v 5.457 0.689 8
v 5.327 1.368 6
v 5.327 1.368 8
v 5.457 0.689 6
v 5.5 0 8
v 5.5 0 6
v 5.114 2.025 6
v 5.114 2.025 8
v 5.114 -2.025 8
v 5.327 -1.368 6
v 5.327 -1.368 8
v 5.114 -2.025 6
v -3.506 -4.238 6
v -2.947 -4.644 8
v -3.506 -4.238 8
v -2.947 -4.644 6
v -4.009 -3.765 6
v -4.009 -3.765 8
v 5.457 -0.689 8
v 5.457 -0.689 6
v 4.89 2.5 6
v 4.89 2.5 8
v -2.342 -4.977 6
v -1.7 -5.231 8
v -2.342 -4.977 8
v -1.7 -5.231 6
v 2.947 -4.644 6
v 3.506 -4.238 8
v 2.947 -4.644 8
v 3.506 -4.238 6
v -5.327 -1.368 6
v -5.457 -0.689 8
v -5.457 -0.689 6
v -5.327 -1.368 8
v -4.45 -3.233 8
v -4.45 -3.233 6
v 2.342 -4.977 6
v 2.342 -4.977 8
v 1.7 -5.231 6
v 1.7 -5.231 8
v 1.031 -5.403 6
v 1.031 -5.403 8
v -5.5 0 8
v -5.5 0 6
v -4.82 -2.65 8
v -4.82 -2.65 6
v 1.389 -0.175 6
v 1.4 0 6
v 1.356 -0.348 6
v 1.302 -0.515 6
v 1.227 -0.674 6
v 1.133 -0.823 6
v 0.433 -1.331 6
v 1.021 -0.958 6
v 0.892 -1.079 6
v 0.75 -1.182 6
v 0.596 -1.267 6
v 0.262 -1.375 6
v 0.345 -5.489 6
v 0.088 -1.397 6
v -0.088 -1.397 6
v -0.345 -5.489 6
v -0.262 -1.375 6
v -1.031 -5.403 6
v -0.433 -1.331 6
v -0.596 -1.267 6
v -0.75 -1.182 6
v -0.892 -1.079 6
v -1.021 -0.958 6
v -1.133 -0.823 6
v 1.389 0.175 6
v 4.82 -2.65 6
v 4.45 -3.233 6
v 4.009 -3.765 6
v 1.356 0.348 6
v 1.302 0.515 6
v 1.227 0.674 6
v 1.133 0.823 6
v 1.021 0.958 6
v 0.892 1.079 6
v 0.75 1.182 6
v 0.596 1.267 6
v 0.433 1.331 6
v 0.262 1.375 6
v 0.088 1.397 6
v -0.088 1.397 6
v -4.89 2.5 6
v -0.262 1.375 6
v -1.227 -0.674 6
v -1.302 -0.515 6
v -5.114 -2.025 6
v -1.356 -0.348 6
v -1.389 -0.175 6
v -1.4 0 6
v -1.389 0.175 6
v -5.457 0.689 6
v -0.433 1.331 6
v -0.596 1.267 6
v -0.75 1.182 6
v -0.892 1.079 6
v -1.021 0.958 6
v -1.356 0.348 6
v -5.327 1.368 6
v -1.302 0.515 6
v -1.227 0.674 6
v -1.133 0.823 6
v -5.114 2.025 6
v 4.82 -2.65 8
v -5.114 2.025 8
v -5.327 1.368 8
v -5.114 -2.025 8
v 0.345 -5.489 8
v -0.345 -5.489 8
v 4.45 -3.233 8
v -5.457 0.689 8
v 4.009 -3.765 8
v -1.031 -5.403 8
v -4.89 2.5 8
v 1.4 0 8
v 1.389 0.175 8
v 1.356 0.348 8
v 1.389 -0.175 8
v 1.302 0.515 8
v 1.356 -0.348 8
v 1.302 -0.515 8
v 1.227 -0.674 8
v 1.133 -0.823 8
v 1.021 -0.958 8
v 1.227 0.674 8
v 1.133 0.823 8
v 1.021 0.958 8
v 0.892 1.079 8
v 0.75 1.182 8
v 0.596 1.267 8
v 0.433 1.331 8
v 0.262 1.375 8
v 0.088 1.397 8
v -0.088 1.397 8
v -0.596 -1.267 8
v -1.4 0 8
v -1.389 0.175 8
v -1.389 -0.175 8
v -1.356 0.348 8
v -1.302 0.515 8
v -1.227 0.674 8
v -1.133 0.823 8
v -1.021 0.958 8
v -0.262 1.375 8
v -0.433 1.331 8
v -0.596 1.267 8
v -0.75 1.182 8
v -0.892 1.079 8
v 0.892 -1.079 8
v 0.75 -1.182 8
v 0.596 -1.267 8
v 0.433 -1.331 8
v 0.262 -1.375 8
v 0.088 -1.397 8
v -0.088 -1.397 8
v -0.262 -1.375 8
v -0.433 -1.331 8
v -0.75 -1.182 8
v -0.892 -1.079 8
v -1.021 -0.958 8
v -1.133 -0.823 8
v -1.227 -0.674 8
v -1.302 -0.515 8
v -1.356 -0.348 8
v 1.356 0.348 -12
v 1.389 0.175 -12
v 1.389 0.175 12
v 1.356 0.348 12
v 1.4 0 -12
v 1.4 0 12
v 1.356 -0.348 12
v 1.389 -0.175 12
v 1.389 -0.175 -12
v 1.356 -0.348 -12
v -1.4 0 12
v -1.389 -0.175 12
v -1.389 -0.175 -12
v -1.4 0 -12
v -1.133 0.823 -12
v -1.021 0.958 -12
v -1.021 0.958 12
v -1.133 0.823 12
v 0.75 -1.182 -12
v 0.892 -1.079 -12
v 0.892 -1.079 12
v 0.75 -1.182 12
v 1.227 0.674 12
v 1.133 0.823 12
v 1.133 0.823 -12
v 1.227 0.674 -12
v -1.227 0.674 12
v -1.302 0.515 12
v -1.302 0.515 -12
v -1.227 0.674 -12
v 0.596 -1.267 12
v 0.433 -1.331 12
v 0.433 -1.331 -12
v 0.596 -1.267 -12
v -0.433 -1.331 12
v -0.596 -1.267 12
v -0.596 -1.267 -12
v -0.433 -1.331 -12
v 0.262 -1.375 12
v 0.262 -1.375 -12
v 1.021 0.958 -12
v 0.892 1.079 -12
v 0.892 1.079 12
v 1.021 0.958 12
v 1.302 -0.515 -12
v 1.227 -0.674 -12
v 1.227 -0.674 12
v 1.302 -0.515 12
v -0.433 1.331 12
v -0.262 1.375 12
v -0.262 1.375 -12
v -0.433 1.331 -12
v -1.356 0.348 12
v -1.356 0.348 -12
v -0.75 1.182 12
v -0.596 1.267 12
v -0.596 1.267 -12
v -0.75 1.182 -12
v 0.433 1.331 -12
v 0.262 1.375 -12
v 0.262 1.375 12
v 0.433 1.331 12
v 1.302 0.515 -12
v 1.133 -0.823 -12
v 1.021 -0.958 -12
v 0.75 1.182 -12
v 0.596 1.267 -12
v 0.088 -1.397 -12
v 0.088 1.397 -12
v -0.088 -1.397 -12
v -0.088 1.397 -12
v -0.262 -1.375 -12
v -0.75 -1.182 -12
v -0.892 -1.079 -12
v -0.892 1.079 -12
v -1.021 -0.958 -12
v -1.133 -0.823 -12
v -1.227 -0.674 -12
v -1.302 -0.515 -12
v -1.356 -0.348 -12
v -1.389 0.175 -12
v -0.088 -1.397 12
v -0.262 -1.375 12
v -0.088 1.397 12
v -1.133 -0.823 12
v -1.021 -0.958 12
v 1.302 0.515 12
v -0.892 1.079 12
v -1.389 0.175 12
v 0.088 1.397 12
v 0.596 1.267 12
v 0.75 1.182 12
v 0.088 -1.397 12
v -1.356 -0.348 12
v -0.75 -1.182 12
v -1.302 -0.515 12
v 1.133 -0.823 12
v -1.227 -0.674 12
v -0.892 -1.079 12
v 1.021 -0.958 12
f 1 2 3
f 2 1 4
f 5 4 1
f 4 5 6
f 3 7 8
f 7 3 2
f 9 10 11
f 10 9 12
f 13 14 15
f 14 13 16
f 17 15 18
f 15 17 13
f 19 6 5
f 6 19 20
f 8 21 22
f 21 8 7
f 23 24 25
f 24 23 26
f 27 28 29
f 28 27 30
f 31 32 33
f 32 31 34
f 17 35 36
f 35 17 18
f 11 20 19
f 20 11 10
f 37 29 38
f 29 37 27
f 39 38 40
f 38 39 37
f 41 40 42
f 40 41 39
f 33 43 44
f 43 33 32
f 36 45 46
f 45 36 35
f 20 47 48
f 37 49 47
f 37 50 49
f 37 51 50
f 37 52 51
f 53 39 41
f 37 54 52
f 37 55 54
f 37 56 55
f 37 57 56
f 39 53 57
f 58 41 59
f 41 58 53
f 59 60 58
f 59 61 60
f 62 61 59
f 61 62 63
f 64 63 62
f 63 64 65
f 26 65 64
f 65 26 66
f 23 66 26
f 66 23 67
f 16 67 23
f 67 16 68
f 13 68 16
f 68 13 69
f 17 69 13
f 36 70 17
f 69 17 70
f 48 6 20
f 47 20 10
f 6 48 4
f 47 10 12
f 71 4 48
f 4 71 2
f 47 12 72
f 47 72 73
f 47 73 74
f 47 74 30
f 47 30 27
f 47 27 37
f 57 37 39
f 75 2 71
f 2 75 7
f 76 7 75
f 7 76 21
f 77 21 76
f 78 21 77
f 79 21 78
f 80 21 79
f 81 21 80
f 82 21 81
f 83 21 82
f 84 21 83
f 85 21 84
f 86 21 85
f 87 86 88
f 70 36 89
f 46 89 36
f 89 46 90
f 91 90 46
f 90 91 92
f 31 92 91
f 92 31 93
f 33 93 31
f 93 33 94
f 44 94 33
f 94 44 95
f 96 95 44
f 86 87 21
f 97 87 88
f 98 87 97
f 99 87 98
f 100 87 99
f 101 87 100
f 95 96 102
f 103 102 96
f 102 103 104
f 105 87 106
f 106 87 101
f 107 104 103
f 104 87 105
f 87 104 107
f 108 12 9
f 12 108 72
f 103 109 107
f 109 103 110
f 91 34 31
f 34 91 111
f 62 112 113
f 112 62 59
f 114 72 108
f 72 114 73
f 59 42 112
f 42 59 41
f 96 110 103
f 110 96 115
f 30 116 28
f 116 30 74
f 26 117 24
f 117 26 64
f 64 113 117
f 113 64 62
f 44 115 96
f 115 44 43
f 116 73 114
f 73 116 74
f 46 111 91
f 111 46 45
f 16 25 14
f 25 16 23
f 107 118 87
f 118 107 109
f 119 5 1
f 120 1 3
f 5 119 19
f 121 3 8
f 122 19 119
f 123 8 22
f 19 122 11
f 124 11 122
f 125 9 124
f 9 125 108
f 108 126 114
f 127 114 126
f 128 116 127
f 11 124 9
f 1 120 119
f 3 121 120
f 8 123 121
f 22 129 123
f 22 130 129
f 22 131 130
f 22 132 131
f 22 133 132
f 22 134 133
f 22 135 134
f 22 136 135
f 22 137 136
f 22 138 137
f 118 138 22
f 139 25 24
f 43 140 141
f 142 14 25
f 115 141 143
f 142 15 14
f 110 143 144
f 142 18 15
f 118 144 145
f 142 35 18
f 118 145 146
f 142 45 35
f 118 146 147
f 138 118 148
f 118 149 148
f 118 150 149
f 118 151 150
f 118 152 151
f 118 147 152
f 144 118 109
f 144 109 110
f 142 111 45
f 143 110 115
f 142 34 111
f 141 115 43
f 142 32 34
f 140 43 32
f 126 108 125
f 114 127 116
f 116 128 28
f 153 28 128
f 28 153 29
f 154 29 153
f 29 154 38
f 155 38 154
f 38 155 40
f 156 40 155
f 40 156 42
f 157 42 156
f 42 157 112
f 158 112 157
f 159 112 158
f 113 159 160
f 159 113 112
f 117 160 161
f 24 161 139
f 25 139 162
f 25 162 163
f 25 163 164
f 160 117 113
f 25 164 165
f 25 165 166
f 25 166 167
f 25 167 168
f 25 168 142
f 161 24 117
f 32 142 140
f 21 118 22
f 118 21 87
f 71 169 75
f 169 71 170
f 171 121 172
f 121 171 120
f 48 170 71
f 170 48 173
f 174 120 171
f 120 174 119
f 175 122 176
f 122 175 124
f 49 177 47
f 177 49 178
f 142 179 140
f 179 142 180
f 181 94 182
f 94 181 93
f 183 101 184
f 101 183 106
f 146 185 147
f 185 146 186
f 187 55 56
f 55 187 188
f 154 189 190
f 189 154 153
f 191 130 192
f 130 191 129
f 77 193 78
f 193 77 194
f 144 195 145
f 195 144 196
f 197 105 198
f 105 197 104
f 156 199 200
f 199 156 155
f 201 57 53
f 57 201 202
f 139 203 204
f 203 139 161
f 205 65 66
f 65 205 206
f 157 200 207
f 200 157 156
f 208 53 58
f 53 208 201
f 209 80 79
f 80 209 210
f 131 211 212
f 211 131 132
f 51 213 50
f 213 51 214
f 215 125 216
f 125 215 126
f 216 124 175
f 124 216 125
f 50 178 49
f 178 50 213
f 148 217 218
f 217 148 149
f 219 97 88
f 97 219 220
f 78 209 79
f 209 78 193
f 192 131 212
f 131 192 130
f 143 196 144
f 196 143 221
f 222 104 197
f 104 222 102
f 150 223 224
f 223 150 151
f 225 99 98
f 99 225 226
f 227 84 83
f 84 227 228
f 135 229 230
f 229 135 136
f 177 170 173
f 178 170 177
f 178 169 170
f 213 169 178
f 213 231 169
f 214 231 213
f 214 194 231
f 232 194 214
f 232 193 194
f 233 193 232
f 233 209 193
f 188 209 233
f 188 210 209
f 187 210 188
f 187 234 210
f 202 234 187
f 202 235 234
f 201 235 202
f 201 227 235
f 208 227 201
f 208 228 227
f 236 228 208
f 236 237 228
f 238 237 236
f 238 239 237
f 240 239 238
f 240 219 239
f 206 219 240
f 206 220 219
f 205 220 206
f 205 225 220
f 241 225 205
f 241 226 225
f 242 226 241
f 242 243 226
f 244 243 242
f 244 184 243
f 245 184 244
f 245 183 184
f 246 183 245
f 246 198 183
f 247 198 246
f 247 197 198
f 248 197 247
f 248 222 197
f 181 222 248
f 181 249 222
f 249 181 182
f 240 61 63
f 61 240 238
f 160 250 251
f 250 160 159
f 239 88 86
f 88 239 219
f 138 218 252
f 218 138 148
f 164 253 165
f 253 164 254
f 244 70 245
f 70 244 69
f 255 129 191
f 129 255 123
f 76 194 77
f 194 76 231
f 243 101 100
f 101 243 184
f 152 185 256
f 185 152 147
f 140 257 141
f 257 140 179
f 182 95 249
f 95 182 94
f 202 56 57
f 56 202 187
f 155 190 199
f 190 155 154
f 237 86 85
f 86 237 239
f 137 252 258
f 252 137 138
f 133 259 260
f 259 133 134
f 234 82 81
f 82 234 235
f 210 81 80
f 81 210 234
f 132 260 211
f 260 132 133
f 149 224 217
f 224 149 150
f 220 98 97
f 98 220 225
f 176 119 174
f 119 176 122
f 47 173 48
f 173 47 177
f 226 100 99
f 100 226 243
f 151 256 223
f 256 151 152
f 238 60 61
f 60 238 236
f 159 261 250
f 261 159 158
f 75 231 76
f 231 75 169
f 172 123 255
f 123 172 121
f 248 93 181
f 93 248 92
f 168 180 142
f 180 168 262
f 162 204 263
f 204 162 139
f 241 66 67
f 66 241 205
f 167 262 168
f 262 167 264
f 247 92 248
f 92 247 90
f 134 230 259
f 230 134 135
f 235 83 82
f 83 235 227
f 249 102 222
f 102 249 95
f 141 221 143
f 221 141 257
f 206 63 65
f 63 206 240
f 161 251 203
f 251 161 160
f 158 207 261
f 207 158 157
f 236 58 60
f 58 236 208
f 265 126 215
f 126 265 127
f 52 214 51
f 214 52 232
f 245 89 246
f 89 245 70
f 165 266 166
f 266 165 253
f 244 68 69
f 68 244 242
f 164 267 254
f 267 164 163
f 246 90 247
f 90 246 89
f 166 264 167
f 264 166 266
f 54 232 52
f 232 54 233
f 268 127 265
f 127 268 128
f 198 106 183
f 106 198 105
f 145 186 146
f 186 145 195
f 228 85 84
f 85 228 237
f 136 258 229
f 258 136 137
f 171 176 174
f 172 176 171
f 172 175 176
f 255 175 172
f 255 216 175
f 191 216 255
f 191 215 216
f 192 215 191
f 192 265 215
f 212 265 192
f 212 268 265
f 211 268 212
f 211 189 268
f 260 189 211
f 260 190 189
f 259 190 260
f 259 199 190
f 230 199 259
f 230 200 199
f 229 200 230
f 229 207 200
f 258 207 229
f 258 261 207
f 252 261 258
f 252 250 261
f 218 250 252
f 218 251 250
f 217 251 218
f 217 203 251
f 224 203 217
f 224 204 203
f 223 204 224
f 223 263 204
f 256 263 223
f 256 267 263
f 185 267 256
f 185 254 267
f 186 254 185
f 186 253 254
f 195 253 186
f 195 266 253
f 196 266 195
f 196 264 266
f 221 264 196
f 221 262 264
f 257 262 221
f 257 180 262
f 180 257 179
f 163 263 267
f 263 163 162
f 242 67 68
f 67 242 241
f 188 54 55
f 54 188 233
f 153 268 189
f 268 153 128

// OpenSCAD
// file: ../robot_settings.scad
main_box_x = 95; // 96
main_box_y = 102;
main_box_z = 74; // 74.5
wall_thickness = 2;

rail_gap = 2;
rail_inset = 7;

rail_thickness = 7;
rail_length = 250;
rail_width = 200;

raspberry_pi_screw_seperation_y = 57;
raspberry_pi_screw_seperation_z = 48;
raspberry_pi_peg_h = 4;

gears_module = 1;
pinion_gear_teeth = 30;
pinion_gear_width = 5;
pinion_gear_bore = 4;

gears_setback_distance = 25;
gear_post_height = 2 * pinion_gear_width + rail_thickness + 8 ;

steering_motor_mount_x = 45;
steering_motor_mount_y = 36;
steering_motor_mount_z = 18;
steering_motor_mount_setback_distance = gears_setback_distance + 16;

dc_motor_drivertype = "Teyleten"; // Teyleten
isAdafruit = (dc_motor_drivertype == "Adafruit");

drv8871_x = isAdafruit ? 20.3 : 21.6;
drv8871_y = isAdafruit ?  24 : 25;

drv8871_z = 2;
drv8871_screw_d = 2.5;
drv8871_solder_points_z = 2;

drv8871mount_edge_x = 1.5;
drv8871mount_edge_wall = 3;
drv8871mount_z = 5;
drv8871mount_x = drv8871_x +  drv8871mount_edge_wall - 2* drv8871mount_edge_x;
drv8871mount_y = 19;

drv8871_screw_distance = 15.64;
drv8871_solder_points_d = 1.66;
drv8871_solder_offset_y = 4.4;
drv8871_solder_inner_points_distance = 5;
drv8871_solder_outer_points_distance = 12;

dc_motor_housing_minus_encoder_z = 48;
dc_motor_encoder_z = 9.33;
dc_motor_encoder_wheel_d = 13.4;
dc_motor_encoder_wheel_thickness = 5;
dc_motor_encoder_wheel_gap = 3;
dc_motor_encoder_circuit_thickness = 2;
dc_motor_cutout_d = 24.8;
dc_motor_cutout_z = 19.5;

dc_motor_screw_head_z = 2;
dc_motor_screw_head_d = 5.6;
dc_motor_screw_d = 3.2;
dc_motor_screw_offset = 8.5;

dc_motor_axle_ring_z = 3;
dc_motor_axle_ring_d = 7.2;
dc_motor_axle_cutout_d = 4.5;
dc_motor_axle_cutout_z = 10;
dc_motor_axle_notch_cutout = 0.4;
dc_motor_axle_notch_cutout_z = 6;

pdmount_x = 20;
pdmount_y = 30;
pdmount_z = 2;
pdmount_edge_x = 1.5;
pdmount_edge_wall = 3;

steering_shaft_z = gear_post_height + dc_motor_axle_ring_z + pinion_gear_width + 15;
steering_shaft_d = 7;
steering_shaft_motor_fitting_d = 9;

lidar_mount_y = 110;
lidar_mount_x = 65 + 20;
lidar_narrow_screws = 40;
lidar_wide_screws = 56;
lidar_front_to_back_screws = 70;
lidar_screw_d = 3;
lidar_circuitboard_x = 20;
lidar_circuitboard_y = 35;
lidar_circuitboard_z = 1.2;
lidar_cord_length = 29;

ball_bearing_height = 7;
ball_bearing_outer_diameter = 22;
ball_bearing_inner_diameter = 8;

pull_bar_radius = 3.3;

rack_module = 1;
rack_length = main_box_x / 2;
rack_height = 10;
rack_width = 10;
rack_teeth = 30;
rack_bore = 3;

// tire hardware
axle_length = 30;
axle_reciever_inner_diameter = 7.75;
axle_reciever_length = 18.8;
axle_notch_length = 7;
axle_notch_cutout = 2.4;

// power distribution bar
power_bar_cutout_x = 96;
power_bar_y = 19.1;
power_bar_z = 1.5;
power_bar_screw_distance = 91.4;
power_bar_screw_d = 2.8;
power_bar_standoff_z = 5;
power_bar_standoff_d = 6.83;

// breadboard
breadboard_wall_thickness = 3;
breadboard_width = 55;
breadboard_length = 83;
breadboard_height = 10.5;
breadboard_notch_width = 3.8;
breadboard_longside_notch_separation = 58.2 - breadboard_notch_width / 2;
breadboard_shortside_notch_separation = 26.3 - breadboard_notch_width;
// main file
include <../robot_settings.scad>
$fn=50;

module battery_box_peg()
{
  
  // note: the diameter of the hole to lock in the battery box to the rail is smaller than the other pin holders. It is 3 not ball_bearing_inner_diameter / 2.
  // also, the rail hole is only a couple milimeters from the platform.
  cylinder(h = ball_bearing_outer_diameter + 2, d = 2.8 , center = true);
  translate([0, 0, ball_bearing_outer_diameter - 15])
  {
    difference() {
    cylinder(h = 2, d = ball_bearing_outer_diameter / 2, center = true);
    translate([-5, 2.5, -2.5])
     cube([10, 5, 5]);
    }
  }
}
battery_box_peg();
